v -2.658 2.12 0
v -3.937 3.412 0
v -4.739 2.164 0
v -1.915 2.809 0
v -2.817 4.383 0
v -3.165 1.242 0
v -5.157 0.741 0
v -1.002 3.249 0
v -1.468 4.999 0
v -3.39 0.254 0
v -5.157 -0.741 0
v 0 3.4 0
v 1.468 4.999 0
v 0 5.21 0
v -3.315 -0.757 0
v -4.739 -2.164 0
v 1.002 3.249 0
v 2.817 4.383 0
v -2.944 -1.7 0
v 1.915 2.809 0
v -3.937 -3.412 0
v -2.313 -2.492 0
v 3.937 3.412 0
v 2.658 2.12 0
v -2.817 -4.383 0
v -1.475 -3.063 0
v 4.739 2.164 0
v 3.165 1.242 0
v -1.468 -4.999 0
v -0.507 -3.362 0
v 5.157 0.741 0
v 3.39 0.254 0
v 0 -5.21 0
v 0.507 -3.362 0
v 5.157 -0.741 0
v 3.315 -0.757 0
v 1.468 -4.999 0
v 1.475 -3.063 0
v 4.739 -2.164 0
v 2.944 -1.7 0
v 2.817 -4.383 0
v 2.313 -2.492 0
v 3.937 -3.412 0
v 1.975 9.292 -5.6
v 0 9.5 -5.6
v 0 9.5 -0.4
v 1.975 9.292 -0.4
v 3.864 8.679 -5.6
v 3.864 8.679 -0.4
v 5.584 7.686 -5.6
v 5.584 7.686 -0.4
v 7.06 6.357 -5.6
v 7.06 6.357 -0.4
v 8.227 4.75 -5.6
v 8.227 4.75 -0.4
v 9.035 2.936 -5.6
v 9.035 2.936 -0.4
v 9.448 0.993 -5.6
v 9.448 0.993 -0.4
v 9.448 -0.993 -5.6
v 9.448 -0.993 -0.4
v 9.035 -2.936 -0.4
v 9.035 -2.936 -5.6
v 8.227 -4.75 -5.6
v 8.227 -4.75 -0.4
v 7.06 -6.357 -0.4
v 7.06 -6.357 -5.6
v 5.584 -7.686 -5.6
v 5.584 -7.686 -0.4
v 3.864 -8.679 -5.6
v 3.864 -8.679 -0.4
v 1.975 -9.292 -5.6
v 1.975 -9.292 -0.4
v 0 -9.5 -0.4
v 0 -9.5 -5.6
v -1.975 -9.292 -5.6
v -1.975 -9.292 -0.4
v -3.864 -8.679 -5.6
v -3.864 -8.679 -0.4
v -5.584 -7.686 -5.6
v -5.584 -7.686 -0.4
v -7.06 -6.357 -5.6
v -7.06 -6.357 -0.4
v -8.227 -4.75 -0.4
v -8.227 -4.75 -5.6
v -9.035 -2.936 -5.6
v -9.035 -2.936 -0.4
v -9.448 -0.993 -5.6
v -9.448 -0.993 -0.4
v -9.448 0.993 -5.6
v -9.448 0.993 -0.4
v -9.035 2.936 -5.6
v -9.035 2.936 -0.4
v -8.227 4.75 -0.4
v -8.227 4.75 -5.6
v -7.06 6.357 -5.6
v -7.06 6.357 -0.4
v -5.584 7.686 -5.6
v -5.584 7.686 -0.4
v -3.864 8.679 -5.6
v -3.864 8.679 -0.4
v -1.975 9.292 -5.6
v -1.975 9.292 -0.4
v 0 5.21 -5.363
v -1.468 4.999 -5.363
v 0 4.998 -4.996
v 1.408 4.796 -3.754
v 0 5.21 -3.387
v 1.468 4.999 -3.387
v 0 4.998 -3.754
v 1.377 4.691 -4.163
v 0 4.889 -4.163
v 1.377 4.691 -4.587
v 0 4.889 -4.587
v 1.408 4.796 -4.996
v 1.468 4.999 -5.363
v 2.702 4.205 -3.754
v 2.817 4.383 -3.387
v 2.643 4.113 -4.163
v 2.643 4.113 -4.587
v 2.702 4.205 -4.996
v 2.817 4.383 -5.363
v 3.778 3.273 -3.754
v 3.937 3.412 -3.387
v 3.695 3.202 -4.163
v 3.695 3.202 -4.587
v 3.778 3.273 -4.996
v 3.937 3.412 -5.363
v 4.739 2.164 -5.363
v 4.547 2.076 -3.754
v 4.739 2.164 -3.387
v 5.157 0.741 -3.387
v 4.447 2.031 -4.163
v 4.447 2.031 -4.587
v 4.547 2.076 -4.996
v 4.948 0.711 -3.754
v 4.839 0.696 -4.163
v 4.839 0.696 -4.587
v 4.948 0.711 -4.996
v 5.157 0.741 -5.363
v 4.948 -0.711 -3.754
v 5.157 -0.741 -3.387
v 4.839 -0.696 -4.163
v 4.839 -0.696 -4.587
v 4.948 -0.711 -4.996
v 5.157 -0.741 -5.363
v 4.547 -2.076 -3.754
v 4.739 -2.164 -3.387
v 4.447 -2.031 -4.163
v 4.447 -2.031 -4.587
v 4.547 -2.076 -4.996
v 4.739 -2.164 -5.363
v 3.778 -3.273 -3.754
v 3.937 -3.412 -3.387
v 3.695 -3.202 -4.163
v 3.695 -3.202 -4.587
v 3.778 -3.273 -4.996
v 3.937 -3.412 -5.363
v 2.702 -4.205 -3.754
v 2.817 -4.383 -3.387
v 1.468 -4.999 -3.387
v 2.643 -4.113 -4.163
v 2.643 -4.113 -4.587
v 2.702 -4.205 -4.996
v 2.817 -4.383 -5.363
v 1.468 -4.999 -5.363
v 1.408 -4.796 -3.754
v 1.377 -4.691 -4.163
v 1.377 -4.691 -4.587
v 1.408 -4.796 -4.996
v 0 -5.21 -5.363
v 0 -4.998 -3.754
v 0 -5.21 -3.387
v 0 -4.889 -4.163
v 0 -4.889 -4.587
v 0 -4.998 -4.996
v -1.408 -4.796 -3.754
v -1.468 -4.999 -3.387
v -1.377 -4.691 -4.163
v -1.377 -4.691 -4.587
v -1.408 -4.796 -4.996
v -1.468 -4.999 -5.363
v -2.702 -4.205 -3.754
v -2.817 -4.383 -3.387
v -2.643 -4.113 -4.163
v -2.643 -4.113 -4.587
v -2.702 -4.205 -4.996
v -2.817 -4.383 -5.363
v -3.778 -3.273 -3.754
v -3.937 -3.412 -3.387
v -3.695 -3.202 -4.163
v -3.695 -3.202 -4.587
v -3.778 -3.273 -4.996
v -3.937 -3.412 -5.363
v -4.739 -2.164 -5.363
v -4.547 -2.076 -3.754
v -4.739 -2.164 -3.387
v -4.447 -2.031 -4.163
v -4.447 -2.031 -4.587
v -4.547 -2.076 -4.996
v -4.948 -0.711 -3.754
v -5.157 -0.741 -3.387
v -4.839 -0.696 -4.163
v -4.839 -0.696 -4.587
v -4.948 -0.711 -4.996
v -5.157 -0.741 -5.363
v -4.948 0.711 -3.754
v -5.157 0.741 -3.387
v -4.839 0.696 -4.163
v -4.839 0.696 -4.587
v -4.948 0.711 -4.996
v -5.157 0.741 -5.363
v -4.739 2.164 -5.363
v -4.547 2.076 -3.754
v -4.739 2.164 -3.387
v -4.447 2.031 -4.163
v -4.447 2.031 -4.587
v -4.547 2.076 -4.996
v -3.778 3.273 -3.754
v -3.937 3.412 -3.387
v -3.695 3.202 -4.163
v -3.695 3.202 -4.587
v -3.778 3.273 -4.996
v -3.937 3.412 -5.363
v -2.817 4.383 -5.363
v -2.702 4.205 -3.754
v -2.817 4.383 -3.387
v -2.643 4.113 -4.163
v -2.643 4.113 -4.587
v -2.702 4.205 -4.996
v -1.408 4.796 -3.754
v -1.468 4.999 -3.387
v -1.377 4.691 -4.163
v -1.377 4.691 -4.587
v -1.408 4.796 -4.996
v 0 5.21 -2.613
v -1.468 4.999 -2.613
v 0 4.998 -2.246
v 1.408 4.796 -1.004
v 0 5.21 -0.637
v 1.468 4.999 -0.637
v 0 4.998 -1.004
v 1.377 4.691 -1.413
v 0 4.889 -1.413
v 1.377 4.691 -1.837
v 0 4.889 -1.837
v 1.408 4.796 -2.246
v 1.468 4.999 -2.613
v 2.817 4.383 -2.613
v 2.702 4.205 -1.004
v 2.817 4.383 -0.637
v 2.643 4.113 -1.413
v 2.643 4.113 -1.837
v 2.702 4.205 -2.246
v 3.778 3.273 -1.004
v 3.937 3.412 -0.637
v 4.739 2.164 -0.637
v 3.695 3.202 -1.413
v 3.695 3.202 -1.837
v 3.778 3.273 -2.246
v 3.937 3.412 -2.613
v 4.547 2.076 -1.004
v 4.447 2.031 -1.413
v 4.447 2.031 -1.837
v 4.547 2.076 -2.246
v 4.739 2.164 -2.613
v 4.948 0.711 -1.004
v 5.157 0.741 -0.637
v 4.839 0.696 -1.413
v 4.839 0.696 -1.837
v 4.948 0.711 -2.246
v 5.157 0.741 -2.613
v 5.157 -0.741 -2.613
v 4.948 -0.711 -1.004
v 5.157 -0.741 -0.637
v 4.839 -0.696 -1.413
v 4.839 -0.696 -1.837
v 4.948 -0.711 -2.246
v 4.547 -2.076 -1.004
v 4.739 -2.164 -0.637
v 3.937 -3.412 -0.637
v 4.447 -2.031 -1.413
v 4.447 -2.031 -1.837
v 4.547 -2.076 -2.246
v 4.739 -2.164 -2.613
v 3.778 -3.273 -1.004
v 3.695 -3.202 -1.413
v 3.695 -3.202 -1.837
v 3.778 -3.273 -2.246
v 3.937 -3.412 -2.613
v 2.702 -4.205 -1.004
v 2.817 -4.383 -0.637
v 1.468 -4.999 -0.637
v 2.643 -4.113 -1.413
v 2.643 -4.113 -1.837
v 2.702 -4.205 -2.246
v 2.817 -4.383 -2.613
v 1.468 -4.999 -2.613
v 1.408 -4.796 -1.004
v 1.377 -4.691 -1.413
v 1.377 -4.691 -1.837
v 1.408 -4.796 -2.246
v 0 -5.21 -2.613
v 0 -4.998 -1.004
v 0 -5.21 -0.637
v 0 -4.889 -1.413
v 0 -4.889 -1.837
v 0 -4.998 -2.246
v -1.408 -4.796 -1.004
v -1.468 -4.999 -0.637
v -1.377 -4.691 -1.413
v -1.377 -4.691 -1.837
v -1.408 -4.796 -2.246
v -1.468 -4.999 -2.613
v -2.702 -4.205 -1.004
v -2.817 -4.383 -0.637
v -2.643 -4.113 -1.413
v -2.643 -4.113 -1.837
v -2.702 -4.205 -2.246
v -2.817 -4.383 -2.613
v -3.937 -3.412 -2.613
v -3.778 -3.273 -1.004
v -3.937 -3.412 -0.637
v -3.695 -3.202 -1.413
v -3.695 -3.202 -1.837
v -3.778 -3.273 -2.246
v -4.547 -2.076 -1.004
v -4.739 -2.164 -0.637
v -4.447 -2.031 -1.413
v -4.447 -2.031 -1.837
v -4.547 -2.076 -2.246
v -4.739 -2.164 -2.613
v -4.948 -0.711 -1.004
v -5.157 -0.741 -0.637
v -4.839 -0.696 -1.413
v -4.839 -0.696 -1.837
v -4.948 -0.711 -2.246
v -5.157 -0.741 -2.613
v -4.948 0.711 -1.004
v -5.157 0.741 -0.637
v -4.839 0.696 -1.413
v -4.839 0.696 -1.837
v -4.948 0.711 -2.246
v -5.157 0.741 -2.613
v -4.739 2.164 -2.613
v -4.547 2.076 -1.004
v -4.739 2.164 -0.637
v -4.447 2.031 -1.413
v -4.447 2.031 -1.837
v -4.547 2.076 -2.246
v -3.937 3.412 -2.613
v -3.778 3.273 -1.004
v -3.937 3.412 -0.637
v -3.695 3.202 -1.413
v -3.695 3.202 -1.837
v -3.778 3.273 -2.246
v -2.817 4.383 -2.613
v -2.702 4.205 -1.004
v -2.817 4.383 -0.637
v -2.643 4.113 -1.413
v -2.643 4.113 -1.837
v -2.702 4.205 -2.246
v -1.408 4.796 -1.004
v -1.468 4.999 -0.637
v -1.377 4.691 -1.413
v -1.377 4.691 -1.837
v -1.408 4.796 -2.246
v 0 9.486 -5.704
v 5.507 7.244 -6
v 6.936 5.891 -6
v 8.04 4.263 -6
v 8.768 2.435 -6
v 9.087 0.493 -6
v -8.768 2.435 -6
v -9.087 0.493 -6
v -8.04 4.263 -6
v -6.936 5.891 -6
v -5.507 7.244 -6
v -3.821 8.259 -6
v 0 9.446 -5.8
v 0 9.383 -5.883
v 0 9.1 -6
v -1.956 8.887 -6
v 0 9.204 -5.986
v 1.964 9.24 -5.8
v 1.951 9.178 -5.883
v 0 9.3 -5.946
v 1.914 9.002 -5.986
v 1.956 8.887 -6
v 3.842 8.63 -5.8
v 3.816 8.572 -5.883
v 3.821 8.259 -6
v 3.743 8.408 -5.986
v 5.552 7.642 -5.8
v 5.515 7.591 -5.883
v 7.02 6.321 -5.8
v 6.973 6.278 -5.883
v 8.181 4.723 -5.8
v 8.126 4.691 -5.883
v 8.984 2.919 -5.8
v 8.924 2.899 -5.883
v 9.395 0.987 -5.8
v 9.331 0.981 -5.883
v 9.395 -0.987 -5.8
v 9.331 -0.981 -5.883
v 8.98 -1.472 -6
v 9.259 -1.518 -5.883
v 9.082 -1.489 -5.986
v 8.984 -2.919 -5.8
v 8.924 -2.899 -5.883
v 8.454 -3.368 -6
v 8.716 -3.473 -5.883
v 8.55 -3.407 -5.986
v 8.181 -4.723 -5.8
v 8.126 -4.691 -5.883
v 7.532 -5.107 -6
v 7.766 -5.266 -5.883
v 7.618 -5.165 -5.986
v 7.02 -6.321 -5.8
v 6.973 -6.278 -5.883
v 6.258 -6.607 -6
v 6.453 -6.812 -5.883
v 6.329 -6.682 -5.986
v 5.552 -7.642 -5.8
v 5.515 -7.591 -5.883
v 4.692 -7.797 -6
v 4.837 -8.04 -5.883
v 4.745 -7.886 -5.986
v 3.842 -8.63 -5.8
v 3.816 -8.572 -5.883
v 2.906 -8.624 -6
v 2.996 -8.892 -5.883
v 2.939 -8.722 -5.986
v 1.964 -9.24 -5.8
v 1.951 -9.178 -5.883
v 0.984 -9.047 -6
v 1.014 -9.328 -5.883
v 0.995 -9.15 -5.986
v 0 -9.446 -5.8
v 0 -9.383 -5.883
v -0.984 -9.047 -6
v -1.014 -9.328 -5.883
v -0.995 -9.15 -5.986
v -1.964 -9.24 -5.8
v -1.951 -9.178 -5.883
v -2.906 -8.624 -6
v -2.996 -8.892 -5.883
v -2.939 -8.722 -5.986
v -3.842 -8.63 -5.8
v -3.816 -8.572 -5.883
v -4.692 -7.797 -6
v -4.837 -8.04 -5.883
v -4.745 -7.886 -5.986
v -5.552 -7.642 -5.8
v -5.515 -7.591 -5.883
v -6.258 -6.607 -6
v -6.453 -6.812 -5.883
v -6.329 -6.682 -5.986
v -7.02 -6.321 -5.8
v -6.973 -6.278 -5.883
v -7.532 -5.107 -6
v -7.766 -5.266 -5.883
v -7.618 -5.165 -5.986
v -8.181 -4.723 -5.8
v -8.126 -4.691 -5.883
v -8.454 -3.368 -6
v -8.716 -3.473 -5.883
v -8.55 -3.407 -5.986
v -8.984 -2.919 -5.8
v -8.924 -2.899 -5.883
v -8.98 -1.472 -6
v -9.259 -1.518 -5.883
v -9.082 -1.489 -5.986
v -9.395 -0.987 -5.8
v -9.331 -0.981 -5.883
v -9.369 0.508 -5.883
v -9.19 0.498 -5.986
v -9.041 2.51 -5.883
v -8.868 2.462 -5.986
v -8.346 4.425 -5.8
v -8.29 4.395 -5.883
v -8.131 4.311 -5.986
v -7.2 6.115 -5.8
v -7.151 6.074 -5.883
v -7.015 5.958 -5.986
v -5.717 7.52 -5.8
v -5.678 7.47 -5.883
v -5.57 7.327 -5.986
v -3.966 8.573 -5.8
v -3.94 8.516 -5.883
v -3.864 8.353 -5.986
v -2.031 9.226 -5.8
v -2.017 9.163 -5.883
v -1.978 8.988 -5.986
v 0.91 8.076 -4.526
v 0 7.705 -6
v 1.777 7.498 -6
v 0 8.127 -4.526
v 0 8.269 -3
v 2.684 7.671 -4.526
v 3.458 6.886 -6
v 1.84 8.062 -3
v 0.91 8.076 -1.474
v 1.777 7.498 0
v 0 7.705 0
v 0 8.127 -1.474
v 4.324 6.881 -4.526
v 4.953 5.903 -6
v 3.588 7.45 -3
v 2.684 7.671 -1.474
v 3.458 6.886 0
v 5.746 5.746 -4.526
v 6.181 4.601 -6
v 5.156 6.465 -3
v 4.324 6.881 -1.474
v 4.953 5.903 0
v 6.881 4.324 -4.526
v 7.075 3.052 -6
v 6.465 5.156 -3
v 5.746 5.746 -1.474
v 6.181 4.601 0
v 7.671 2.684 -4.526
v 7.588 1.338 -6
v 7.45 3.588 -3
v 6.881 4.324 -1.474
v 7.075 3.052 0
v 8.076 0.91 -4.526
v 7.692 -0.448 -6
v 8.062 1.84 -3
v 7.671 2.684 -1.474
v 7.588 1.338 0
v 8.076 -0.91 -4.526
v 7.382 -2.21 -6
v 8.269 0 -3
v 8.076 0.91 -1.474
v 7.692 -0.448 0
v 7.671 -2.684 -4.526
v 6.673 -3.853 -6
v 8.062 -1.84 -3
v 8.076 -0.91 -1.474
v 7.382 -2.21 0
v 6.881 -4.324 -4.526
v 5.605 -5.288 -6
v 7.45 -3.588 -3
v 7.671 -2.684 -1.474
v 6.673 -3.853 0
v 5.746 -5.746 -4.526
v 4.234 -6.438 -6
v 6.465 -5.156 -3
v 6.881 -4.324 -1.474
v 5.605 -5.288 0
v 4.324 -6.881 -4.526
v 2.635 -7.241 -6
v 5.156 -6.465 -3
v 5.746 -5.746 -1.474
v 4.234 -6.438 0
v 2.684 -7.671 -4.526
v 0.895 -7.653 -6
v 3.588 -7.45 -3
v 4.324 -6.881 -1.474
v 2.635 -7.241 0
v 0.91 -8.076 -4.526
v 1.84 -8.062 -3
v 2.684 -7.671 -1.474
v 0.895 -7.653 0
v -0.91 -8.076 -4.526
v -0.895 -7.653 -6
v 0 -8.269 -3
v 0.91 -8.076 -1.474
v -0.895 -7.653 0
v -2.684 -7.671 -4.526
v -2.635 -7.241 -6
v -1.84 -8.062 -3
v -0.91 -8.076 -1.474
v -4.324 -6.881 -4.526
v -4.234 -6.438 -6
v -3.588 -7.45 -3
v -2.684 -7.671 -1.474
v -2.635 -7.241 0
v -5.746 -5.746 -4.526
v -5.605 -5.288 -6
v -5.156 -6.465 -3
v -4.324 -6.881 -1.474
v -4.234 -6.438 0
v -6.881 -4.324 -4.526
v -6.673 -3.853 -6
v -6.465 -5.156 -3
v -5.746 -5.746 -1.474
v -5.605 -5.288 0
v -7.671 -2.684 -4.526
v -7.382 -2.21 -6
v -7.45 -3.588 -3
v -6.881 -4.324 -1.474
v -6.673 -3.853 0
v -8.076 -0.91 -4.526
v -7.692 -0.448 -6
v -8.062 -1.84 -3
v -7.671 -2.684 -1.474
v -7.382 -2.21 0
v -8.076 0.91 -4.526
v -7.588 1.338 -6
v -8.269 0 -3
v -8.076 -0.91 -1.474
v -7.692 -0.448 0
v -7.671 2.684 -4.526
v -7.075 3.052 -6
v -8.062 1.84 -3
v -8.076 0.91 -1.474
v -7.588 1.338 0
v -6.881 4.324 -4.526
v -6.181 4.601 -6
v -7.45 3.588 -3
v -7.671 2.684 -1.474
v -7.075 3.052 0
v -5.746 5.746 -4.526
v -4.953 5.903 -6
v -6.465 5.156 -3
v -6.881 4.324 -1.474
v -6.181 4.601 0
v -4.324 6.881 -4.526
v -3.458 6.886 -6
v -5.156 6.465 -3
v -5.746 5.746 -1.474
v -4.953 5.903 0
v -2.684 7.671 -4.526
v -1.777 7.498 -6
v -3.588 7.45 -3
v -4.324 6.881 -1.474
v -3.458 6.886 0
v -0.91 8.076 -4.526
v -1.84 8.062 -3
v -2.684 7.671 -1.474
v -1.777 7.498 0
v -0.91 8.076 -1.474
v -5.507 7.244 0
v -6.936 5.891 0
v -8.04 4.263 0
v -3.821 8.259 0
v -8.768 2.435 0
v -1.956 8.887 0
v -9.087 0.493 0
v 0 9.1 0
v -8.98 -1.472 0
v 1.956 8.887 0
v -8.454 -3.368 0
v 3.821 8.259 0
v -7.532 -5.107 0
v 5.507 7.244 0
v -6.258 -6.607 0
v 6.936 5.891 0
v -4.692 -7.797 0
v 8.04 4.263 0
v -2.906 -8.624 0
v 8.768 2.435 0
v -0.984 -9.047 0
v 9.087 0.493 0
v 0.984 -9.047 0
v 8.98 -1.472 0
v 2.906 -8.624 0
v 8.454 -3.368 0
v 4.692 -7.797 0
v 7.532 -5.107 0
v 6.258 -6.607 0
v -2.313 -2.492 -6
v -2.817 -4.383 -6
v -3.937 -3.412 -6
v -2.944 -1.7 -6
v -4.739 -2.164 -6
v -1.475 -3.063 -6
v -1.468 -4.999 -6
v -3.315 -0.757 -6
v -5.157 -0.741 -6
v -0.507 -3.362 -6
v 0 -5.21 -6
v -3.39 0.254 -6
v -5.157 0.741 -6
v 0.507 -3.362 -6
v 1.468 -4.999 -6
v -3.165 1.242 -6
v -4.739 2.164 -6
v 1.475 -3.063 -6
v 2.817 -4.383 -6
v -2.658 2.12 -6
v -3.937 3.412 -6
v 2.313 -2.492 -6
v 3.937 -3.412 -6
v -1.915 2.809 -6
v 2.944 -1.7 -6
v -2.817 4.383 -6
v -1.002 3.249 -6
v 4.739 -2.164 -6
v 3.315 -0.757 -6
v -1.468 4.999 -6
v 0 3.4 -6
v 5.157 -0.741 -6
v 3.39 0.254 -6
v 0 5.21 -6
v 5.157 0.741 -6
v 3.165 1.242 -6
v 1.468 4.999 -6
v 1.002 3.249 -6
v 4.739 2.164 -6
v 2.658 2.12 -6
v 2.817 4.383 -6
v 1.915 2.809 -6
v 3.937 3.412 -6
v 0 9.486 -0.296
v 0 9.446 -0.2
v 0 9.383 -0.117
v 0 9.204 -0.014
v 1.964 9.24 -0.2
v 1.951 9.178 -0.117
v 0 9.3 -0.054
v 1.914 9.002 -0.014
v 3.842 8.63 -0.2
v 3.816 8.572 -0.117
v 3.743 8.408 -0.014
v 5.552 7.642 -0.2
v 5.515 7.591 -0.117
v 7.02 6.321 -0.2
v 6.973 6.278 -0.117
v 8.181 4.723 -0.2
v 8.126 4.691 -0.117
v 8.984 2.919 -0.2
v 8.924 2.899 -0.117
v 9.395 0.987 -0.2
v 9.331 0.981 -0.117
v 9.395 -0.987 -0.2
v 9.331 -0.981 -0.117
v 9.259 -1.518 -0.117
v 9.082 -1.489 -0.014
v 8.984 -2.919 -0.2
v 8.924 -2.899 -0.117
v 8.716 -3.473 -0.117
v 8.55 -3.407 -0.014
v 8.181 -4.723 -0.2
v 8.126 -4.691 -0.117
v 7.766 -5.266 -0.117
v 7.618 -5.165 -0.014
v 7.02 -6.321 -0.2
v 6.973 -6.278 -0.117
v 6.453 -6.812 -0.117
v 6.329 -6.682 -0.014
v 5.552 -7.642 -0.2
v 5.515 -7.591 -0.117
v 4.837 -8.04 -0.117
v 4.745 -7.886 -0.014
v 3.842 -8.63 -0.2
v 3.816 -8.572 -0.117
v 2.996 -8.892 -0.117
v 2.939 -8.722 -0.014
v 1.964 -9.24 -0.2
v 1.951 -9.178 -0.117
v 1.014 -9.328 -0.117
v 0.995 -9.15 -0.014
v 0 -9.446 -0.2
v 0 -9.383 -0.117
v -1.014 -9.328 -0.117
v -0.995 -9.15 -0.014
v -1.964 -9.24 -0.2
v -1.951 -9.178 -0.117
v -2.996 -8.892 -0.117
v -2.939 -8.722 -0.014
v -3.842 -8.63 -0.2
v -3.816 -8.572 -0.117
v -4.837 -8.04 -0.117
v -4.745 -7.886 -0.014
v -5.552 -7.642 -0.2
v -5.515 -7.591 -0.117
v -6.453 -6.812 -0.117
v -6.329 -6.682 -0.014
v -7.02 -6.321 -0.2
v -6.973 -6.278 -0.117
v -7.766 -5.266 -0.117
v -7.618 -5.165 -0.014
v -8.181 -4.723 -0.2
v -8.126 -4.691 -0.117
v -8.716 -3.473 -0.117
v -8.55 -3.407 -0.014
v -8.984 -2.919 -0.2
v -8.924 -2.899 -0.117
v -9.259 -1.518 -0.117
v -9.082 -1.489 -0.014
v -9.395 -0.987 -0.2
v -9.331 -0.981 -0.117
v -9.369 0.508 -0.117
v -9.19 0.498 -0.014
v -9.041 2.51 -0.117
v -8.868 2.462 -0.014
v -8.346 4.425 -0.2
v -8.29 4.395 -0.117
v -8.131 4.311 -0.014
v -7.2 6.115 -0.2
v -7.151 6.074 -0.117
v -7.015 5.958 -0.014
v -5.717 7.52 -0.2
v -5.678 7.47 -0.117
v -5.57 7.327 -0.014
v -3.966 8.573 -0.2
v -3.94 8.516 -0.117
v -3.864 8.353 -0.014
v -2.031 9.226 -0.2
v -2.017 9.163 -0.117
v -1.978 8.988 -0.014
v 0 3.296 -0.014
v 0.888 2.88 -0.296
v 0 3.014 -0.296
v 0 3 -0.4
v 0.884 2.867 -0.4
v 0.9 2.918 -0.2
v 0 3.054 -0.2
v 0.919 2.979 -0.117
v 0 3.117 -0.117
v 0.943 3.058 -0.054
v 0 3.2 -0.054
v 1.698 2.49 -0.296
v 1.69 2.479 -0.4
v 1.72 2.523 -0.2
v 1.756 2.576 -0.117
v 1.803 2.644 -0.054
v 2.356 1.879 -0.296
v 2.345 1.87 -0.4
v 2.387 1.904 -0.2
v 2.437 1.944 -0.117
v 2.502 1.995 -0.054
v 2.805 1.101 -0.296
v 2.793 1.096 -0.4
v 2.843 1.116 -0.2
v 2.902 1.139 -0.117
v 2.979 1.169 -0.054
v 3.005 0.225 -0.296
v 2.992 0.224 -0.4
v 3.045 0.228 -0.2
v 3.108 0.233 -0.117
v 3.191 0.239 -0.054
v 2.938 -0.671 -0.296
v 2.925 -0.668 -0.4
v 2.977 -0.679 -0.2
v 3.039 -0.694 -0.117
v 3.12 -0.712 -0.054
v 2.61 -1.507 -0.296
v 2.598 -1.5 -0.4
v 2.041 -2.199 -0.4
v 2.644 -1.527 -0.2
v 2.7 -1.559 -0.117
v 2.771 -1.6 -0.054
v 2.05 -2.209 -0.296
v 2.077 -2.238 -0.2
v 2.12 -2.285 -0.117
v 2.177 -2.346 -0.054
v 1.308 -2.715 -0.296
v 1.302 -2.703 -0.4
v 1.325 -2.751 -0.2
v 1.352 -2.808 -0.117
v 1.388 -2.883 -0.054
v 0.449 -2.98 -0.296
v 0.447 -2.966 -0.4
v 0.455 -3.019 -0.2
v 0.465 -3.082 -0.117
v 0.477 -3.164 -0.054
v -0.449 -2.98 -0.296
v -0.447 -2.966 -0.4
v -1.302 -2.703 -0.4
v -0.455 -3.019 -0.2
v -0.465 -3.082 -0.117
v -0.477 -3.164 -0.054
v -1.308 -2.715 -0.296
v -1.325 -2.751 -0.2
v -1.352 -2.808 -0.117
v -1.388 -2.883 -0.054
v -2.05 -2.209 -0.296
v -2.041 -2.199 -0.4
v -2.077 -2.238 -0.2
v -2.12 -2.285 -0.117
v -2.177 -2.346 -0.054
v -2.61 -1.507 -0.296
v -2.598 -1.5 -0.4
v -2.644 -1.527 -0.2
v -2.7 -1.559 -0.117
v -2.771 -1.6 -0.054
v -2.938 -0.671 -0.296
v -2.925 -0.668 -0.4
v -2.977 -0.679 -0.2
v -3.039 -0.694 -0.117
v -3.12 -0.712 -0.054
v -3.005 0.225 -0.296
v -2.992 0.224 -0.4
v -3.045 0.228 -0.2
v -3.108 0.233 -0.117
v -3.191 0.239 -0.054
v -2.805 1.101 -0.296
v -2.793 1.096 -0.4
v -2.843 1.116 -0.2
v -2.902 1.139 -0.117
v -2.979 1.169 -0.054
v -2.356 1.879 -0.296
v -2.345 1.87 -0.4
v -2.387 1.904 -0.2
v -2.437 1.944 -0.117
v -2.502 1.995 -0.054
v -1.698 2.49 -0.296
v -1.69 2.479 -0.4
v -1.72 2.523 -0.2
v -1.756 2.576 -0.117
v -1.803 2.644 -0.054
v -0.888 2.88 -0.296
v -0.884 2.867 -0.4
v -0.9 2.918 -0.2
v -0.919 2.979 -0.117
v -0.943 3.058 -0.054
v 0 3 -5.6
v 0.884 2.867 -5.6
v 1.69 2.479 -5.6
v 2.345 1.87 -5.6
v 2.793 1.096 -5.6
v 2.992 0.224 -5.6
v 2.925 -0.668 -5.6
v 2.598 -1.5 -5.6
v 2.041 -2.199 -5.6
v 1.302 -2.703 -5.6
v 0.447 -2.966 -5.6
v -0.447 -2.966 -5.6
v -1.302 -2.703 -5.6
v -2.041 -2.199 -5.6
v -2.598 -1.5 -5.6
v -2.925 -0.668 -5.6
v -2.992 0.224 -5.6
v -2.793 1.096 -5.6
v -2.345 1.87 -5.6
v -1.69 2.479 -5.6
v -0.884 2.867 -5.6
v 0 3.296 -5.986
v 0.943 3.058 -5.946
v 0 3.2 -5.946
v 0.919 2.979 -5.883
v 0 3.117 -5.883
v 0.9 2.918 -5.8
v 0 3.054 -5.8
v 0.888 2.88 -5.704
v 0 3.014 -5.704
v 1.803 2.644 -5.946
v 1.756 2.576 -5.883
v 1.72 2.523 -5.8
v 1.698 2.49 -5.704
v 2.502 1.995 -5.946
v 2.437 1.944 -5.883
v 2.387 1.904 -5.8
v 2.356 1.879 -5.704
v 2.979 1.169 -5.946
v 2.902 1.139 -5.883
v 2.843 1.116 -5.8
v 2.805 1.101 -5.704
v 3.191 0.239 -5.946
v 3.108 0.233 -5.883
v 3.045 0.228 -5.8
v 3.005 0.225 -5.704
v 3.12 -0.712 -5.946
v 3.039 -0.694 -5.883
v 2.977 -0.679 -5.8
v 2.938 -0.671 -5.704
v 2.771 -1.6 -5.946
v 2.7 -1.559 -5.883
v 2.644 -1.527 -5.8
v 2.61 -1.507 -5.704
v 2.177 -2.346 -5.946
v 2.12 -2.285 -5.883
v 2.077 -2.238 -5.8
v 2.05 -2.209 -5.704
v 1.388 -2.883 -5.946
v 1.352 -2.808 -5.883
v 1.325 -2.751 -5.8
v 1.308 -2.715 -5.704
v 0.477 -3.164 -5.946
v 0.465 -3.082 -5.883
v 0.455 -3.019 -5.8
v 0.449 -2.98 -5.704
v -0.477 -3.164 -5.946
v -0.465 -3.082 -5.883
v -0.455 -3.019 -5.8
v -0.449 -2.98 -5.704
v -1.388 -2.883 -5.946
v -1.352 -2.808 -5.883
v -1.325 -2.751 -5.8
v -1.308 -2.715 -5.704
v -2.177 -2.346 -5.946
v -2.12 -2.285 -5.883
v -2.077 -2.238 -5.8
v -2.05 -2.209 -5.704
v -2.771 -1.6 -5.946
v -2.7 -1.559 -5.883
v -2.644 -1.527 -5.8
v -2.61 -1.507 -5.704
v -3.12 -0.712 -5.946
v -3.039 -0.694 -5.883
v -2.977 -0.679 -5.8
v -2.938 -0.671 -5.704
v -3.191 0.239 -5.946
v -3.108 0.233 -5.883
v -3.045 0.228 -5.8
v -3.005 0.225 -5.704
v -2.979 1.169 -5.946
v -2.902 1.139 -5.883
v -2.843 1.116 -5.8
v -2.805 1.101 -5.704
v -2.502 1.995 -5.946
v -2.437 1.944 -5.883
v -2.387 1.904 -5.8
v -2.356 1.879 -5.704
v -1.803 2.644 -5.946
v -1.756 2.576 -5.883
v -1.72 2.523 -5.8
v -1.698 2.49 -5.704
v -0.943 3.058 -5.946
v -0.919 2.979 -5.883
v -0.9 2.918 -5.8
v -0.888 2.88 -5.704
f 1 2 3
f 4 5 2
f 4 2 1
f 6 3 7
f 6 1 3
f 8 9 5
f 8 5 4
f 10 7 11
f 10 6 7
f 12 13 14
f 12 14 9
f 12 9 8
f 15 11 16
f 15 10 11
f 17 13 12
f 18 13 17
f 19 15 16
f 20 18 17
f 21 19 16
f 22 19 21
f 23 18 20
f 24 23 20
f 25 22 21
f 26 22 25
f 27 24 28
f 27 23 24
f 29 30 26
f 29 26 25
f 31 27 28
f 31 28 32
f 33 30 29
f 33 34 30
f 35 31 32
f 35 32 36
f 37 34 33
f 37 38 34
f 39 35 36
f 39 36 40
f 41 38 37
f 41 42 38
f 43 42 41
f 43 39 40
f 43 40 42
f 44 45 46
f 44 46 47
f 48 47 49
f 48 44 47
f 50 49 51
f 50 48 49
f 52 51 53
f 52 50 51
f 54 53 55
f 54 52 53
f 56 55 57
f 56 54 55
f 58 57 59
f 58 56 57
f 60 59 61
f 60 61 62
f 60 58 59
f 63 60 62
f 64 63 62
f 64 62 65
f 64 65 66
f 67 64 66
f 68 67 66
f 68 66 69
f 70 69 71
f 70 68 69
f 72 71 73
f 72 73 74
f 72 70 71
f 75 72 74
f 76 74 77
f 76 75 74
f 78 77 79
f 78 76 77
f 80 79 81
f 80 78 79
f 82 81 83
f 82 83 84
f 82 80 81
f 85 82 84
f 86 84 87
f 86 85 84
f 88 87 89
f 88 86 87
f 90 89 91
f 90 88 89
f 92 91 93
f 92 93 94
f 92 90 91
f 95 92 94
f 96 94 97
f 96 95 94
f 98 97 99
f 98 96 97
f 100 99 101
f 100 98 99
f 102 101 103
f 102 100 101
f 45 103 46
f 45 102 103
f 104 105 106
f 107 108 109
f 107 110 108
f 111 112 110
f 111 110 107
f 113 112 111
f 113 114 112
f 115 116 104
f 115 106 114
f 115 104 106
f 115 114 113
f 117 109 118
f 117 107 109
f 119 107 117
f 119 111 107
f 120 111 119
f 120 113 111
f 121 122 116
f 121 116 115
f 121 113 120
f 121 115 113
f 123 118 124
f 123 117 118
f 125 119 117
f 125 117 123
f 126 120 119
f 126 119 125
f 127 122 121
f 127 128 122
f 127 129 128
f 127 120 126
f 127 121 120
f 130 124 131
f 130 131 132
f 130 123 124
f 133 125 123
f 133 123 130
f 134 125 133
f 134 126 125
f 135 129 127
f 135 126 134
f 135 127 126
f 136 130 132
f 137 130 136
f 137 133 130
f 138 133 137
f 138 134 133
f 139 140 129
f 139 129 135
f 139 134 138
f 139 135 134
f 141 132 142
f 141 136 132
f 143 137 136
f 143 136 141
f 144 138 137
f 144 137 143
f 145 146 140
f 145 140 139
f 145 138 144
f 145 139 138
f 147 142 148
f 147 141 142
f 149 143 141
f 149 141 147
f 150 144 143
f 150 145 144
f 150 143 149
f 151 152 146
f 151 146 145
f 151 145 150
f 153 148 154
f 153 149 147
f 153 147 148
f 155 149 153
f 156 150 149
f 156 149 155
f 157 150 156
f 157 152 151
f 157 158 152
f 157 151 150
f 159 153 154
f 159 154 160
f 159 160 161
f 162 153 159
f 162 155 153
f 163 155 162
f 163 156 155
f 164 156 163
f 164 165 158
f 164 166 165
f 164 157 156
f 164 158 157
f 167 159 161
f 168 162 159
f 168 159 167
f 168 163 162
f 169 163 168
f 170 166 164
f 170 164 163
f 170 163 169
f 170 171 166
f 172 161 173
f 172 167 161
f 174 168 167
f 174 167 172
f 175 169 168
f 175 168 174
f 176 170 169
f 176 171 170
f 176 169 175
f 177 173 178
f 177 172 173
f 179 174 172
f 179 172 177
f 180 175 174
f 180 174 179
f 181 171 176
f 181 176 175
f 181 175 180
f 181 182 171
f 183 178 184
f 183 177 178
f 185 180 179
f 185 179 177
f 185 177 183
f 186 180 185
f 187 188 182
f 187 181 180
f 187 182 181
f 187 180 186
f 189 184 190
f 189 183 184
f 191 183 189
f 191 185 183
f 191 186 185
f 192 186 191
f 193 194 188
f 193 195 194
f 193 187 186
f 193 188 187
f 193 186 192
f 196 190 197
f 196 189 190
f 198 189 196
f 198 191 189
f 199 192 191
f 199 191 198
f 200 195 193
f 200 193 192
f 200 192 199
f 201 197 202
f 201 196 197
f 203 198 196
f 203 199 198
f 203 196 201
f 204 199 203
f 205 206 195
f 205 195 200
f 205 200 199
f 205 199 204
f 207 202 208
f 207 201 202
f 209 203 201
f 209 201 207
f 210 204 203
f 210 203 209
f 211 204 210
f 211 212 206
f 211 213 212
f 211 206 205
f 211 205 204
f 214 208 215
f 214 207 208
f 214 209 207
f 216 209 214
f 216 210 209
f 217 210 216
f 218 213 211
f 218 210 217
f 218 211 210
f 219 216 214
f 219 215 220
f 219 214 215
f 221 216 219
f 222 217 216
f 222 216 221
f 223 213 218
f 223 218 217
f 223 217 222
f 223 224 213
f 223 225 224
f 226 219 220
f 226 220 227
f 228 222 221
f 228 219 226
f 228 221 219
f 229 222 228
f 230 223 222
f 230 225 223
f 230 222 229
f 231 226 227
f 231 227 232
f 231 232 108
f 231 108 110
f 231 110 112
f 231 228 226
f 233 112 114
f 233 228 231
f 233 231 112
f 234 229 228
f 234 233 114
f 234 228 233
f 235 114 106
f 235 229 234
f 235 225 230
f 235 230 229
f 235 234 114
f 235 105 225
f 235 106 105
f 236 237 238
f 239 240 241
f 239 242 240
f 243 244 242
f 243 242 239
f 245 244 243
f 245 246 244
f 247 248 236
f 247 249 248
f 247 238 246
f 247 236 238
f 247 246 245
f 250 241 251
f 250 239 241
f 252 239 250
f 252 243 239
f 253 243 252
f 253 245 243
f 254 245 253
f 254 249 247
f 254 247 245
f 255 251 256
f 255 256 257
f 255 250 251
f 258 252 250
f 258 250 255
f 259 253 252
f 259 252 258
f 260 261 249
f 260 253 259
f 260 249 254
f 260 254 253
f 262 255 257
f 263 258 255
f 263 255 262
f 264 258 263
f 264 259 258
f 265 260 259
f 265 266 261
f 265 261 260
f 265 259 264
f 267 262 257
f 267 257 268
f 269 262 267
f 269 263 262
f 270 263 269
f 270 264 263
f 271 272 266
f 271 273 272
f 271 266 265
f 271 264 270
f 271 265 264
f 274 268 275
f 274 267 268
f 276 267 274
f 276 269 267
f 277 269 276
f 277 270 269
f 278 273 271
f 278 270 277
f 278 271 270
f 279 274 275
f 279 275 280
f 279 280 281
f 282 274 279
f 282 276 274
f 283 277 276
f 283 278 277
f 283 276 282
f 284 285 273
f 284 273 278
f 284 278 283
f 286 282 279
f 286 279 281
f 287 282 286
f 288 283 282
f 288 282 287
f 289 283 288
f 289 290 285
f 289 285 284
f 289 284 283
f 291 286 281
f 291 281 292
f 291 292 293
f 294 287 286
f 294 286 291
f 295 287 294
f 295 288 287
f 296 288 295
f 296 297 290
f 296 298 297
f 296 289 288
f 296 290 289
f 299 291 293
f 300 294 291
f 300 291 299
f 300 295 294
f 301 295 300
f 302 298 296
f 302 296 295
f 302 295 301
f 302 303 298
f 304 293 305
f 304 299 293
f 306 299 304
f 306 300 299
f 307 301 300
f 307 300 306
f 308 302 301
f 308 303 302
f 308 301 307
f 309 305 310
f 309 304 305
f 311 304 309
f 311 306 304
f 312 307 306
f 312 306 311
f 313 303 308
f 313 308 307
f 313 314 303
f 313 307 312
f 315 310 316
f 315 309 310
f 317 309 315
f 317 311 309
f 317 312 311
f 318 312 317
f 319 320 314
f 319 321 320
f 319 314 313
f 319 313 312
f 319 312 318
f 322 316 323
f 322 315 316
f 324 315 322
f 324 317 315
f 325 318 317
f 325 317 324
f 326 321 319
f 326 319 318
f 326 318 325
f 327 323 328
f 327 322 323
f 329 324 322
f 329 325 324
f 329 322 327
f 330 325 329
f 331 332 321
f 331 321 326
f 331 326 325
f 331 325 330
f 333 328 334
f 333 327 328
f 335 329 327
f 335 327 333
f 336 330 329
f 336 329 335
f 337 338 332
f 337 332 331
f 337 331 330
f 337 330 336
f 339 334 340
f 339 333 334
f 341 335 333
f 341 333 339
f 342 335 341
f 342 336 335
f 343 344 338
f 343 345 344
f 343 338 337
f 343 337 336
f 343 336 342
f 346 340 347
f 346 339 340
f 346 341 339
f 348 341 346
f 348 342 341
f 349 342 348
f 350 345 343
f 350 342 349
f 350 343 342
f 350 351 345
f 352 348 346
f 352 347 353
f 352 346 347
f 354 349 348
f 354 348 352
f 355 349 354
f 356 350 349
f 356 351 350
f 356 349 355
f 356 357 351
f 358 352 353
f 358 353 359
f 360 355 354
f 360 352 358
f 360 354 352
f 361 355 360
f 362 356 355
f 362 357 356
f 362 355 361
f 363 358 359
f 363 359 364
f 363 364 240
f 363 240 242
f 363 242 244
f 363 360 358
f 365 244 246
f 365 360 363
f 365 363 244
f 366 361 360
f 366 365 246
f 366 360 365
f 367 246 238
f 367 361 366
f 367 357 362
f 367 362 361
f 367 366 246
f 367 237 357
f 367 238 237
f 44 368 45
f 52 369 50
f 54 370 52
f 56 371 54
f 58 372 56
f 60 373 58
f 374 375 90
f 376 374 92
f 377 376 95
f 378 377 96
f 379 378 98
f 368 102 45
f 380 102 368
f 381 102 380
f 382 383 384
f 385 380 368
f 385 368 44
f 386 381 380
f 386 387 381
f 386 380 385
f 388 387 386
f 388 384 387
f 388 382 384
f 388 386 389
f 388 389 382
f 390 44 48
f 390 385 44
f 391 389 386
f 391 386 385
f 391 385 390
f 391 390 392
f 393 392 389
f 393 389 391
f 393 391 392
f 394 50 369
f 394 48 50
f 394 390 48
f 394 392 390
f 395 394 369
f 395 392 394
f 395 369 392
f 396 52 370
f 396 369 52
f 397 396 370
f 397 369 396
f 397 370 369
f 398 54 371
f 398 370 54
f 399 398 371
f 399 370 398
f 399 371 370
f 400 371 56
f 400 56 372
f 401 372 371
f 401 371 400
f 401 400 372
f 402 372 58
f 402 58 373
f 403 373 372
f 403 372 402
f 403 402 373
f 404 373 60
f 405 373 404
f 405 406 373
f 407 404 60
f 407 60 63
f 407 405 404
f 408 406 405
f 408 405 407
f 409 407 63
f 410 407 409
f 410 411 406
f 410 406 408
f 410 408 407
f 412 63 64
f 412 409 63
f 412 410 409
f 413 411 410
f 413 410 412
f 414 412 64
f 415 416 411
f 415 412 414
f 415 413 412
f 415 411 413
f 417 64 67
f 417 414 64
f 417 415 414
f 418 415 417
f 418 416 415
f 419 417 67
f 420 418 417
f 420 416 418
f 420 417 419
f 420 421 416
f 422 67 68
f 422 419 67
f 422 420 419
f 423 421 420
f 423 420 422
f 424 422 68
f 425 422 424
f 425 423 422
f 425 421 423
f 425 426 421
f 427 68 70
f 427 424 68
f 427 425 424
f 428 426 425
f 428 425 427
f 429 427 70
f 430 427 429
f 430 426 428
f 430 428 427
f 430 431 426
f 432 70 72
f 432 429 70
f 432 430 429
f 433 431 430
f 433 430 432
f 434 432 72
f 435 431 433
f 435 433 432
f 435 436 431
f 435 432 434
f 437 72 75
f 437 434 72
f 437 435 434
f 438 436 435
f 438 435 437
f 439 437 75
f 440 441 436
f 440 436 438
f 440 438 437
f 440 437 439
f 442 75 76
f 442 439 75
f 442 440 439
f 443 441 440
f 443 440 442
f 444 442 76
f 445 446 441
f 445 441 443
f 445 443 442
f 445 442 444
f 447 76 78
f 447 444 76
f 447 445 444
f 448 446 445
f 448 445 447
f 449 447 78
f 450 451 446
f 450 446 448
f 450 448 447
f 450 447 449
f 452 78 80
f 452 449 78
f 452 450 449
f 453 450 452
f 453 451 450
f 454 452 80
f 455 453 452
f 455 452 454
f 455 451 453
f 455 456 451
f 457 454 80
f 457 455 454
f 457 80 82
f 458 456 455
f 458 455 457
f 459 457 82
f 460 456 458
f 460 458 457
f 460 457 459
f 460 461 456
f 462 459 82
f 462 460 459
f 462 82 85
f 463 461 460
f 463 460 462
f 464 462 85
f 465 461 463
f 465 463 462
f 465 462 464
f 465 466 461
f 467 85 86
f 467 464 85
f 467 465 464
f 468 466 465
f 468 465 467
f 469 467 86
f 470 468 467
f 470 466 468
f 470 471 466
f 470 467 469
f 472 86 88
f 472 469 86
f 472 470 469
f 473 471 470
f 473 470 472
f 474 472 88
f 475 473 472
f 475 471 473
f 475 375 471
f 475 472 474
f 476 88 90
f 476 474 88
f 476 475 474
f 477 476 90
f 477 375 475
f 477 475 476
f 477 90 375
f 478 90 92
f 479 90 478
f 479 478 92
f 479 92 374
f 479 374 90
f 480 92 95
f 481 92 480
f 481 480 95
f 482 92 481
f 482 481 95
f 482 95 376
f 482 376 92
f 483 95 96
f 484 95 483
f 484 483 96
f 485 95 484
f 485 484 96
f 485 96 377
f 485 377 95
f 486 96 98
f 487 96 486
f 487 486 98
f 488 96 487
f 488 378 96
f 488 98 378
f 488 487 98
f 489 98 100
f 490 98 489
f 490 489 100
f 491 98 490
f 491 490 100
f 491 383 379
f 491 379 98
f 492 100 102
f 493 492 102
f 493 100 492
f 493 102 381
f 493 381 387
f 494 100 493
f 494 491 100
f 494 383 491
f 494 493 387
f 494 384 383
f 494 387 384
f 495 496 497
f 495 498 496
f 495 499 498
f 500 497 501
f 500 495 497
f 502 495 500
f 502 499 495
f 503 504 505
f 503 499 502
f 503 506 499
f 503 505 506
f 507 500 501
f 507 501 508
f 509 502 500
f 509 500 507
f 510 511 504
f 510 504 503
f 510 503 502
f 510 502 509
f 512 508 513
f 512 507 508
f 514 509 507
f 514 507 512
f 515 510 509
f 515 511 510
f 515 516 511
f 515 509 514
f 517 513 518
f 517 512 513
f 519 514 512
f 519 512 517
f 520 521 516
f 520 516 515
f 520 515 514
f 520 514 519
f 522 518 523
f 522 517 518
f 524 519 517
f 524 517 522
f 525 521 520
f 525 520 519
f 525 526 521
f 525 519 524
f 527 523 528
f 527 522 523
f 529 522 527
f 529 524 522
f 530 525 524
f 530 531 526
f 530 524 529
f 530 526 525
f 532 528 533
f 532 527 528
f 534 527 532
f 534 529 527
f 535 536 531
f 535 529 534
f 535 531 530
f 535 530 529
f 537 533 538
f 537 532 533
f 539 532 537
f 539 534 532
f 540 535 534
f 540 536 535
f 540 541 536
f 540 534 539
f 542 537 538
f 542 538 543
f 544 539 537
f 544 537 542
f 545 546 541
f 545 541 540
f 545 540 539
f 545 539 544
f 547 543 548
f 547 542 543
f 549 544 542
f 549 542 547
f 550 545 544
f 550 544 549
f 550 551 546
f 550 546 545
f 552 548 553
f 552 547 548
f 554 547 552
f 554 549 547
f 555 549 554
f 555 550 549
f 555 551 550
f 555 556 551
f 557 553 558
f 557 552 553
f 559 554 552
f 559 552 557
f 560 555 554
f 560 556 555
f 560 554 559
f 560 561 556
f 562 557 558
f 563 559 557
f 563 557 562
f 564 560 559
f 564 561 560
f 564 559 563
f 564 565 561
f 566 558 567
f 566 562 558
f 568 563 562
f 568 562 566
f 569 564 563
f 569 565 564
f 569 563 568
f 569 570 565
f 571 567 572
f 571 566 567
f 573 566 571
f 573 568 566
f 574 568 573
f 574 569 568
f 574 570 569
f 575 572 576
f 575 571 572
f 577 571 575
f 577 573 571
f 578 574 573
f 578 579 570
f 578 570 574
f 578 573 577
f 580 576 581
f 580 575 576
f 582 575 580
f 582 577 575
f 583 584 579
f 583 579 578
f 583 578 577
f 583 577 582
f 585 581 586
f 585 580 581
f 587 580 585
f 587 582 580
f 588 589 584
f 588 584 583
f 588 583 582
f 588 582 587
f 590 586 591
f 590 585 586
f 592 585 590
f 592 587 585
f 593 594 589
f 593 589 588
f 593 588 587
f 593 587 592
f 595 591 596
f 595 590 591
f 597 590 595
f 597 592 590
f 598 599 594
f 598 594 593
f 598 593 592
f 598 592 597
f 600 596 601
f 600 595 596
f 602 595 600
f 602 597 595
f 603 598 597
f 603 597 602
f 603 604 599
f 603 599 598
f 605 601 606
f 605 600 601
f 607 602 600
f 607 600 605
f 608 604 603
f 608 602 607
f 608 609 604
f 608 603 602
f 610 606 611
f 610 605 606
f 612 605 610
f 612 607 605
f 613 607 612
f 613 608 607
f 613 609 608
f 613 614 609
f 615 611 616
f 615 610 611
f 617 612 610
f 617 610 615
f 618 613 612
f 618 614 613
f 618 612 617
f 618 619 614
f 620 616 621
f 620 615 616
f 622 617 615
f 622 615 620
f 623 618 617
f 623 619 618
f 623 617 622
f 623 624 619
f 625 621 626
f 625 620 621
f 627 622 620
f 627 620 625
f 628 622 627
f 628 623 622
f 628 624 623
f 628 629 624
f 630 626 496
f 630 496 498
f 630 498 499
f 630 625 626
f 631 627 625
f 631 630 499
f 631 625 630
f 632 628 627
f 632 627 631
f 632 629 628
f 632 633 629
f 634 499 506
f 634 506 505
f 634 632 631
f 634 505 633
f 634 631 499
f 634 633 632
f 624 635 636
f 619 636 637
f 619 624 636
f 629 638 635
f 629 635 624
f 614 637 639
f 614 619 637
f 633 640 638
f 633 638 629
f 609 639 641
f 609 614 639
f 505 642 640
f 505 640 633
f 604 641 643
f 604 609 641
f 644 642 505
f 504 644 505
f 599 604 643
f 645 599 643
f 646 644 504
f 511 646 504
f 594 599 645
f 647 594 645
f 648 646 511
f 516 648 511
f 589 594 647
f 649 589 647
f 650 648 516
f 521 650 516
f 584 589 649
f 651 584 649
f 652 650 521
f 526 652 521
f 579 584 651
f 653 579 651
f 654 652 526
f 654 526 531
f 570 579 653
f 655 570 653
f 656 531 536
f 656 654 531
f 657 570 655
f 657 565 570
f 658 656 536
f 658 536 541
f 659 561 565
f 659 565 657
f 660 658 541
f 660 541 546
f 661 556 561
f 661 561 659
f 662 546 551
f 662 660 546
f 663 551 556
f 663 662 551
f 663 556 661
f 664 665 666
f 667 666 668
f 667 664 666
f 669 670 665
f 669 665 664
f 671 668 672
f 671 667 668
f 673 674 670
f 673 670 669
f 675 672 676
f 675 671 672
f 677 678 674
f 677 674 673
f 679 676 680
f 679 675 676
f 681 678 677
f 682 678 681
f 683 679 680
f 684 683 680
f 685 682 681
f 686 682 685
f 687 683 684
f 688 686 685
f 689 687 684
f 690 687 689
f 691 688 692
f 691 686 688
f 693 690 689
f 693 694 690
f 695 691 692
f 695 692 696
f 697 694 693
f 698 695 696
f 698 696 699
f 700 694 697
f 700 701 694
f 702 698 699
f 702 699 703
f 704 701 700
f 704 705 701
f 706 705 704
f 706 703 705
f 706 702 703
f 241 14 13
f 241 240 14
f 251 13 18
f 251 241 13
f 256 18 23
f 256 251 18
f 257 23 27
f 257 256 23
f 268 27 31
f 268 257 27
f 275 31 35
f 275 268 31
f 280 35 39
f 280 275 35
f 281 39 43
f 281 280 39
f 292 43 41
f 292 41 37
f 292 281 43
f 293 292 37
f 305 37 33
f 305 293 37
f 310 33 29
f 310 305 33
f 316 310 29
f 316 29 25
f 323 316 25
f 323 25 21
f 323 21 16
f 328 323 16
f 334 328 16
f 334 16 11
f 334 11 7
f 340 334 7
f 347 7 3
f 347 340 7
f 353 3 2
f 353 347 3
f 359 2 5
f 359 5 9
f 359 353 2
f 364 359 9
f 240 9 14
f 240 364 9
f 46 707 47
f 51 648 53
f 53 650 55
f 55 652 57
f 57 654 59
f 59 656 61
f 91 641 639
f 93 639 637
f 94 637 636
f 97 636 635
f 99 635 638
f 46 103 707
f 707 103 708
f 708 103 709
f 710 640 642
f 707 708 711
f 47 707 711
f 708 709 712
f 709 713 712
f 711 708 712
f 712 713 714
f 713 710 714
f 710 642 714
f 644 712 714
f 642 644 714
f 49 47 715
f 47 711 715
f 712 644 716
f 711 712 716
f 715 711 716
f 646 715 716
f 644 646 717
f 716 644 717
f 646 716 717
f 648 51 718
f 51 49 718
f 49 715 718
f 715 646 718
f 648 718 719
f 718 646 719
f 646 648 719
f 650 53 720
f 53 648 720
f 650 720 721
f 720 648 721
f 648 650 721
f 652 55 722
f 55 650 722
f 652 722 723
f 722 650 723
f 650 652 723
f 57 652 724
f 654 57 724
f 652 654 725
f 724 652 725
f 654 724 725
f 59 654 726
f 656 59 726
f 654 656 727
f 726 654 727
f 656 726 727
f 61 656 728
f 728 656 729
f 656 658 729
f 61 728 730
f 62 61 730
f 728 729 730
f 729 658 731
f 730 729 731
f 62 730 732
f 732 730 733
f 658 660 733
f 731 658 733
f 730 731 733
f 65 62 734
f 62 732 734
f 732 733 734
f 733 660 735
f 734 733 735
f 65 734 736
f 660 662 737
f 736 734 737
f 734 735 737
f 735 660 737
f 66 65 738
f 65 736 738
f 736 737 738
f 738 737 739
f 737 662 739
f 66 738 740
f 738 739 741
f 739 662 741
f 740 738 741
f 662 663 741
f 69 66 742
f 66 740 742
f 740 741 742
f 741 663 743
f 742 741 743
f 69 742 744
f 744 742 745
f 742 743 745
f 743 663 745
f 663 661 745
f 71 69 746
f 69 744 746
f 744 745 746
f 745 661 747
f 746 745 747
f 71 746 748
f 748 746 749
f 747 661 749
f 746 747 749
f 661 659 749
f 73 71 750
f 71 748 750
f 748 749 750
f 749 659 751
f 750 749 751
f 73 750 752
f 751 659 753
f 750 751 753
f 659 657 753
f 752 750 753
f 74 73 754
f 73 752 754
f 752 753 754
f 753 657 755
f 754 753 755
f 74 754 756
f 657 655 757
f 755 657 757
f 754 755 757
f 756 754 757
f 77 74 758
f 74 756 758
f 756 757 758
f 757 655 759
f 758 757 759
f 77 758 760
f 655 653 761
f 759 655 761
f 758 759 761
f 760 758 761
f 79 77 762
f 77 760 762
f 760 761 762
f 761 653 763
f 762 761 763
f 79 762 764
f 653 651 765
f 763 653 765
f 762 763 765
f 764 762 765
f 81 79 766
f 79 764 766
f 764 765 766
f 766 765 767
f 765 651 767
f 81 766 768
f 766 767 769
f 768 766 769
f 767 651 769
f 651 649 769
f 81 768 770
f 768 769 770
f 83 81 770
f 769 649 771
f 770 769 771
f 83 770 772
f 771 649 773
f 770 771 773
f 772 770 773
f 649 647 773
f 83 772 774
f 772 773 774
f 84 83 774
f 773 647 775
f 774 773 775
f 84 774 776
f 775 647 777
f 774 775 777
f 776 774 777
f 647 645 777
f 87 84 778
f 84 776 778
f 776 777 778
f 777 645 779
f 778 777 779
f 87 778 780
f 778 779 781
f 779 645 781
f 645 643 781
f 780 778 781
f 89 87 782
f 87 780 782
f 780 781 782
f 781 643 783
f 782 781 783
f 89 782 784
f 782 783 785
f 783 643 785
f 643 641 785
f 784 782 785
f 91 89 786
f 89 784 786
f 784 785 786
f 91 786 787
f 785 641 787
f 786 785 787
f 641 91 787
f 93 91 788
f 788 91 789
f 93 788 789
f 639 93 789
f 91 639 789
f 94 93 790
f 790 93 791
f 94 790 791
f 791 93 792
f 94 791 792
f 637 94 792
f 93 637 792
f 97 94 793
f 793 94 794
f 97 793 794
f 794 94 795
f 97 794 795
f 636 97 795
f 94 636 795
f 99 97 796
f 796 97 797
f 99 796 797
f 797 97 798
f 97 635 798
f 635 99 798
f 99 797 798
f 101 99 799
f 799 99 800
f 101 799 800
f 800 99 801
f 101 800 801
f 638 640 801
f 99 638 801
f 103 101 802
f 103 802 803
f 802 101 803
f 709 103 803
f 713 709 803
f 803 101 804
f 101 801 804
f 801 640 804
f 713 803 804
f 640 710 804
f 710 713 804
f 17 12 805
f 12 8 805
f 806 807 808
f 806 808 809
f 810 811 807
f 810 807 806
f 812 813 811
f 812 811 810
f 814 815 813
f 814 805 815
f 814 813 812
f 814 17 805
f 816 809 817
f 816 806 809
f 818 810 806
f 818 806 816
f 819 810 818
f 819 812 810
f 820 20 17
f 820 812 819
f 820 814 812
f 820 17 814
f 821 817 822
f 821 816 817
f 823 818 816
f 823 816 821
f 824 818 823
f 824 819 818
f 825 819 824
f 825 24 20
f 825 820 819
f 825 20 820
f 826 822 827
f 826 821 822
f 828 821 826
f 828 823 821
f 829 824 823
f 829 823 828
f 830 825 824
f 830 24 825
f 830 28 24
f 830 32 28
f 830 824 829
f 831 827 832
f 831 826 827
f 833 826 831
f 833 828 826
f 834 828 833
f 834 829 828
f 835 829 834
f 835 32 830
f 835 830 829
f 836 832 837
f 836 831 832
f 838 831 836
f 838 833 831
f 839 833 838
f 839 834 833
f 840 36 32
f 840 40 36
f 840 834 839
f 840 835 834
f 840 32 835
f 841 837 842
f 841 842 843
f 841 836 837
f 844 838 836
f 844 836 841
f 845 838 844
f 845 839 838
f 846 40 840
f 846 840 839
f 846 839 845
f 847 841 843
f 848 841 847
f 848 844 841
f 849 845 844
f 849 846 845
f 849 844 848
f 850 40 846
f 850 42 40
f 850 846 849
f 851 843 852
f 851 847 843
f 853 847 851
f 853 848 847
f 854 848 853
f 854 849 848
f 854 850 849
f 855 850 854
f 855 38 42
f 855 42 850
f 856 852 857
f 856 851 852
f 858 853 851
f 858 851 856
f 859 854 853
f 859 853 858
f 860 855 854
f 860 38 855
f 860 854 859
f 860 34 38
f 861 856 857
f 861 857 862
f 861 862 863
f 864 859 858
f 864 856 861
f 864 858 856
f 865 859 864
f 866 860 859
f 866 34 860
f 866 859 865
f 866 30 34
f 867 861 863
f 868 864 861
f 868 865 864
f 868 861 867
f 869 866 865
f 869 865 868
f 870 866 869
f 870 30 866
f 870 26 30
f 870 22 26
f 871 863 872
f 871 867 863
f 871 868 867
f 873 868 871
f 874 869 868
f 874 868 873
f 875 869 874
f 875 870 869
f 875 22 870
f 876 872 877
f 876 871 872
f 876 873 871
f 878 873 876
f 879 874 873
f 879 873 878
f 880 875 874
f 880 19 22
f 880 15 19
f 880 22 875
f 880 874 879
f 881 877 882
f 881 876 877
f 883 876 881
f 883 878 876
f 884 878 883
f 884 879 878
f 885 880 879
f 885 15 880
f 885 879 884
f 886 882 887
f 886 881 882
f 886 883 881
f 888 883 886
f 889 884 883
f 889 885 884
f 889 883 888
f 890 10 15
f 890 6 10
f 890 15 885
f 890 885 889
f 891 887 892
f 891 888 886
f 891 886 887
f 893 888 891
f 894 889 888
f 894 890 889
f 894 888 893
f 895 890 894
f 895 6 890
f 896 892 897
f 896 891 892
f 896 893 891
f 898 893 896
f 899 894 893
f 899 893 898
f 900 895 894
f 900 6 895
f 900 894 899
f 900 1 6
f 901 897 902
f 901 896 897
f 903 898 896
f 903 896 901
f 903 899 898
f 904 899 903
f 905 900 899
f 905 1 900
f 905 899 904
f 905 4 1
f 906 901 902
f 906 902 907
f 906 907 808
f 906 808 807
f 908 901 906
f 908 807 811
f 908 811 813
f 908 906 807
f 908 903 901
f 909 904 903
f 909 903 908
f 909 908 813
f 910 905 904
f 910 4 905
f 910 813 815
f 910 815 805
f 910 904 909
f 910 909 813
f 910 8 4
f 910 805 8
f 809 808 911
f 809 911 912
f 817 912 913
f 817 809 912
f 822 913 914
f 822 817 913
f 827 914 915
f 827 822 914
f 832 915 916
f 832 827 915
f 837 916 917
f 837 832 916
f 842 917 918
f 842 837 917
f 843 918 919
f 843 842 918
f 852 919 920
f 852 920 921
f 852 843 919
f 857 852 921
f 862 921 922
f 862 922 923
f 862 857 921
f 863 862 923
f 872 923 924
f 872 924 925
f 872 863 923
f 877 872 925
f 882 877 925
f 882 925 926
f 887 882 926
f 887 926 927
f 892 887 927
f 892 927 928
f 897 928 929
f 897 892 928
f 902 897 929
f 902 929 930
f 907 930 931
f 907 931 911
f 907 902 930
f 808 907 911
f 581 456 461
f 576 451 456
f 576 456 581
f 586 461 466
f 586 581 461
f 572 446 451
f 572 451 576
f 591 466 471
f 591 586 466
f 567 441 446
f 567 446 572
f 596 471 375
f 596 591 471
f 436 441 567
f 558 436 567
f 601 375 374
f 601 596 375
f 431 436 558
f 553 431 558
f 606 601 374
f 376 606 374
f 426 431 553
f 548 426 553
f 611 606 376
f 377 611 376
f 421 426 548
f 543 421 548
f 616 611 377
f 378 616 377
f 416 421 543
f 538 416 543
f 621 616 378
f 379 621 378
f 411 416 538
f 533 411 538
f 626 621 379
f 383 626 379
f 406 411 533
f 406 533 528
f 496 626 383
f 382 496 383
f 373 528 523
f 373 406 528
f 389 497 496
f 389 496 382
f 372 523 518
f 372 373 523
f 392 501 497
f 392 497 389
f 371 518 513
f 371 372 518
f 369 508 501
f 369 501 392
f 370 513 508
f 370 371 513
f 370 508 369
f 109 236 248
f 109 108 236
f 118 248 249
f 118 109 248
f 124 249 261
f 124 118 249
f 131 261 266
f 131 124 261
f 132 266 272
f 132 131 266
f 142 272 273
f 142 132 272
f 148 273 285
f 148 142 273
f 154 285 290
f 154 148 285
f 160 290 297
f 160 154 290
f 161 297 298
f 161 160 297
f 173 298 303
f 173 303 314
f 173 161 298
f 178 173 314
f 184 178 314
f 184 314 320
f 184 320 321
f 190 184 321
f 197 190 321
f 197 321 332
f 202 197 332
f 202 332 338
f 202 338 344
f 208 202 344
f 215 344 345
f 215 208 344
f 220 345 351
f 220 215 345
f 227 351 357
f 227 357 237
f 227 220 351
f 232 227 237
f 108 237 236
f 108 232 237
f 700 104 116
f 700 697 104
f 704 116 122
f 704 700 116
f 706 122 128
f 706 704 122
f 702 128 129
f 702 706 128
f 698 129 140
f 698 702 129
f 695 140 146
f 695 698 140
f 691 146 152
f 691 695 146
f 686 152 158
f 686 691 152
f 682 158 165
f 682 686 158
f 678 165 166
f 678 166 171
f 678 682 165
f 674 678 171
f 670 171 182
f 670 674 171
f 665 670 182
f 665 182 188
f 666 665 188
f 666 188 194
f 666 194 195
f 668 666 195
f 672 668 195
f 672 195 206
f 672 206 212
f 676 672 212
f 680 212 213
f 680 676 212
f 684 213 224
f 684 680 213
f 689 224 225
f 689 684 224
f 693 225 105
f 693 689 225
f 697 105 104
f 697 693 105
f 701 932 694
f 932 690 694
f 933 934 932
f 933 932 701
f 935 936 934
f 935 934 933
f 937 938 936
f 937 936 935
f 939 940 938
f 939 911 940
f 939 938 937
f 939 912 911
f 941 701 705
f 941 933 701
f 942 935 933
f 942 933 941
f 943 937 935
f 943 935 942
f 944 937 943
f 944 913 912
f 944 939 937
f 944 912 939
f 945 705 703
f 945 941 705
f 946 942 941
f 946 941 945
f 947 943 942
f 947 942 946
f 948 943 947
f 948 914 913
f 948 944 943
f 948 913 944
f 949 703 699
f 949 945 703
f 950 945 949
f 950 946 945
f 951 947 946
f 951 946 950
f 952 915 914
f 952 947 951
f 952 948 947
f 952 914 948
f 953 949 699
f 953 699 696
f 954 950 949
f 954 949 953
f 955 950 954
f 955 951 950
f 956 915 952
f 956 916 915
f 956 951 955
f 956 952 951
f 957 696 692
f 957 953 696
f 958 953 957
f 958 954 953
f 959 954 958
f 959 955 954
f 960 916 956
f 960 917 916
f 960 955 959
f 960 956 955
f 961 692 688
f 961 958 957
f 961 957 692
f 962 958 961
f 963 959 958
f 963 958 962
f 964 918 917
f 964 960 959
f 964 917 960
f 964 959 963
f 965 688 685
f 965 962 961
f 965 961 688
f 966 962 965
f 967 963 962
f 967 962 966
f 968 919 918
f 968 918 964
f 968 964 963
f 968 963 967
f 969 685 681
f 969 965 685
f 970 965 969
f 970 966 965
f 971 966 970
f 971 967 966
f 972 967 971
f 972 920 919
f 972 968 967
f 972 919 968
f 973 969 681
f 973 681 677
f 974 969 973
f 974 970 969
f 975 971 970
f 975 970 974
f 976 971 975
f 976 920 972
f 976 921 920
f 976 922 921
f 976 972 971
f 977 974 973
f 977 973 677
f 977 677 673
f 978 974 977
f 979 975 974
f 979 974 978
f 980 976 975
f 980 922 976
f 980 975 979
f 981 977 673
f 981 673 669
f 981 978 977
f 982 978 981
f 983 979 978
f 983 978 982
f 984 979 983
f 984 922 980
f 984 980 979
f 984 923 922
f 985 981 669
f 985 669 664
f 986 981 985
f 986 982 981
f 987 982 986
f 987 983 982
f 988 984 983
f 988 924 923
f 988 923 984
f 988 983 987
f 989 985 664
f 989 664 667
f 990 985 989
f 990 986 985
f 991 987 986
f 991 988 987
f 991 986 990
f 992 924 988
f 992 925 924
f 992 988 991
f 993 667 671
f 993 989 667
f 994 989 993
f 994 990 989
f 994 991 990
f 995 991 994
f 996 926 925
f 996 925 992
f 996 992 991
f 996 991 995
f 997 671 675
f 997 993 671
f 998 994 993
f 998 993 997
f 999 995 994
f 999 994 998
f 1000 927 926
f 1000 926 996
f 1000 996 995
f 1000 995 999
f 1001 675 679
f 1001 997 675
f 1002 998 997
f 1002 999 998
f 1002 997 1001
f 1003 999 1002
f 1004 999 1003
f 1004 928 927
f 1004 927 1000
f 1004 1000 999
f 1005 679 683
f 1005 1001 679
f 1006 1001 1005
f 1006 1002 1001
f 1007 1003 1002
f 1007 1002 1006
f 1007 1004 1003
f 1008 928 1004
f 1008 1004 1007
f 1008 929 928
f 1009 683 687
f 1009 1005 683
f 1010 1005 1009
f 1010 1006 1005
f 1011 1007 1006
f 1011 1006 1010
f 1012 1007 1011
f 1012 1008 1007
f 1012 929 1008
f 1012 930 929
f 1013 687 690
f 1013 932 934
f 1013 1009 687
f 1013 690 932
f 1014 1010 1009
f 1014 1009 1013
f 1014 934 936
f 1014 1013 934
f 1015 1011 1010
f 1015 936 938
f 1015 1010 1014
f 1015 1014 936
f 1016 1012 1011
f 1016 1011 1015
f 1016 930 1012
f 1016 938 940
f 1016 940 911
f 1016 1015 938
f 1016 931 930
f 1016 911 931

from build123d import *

# Parameters (mm, degrees)
FILLET_1_R = 0.4
FILLET_2_R = 0.4


with BuildPart() as part:
    # Эскиз1 → Повернуть1 (revolve)
    with BuildSketch(Plane(origin=(0, 0, 0), x_dir=(0, 0, -1), z_dir=(1, 0, 0))):
        with BuildLine():
            Line((0, 5.21), (0.636807205, 5.21))
            ThreePointArc((0.636807205, 5.21), (1.625, 4.875), (2.613192795, 5.21))
            Line((2.613192795, 5.21), (3.386807205, 5.21))
            ThreePointArc((3.386807205, 5.21), (4.375, 4.875), (5.363192795, 5.21))
            Line((5.363192795, 5.21), (6, 5.21))
            Line((6, 5.21), (6, 3))
            Line((6, 3), (0, 3))
            Line((0, 3), (0, 5.21))
        make_face()
        with BuildLine():
            Line((0, 9.5), (6, 9.5))
            Line((6, 9.5), (6, 7.705435334))
            ThreePointArc((6, 7.705435334), (3, 8.268841133), (0, 7.705435334))
            Line((0, 7.705435334), (0, 9.5))
        make_face()
    revolve(axis=Axis((0, 0, 0), (0, 0, -1)))

    # Скругление1
    fillet_1_edges = [part.edges().sort_by_distance(p)[0] for p in [
        (0, -3, -6),
        (0, -3, 0),
    ]]
    fillet(fillet_1_edges, radius=FILLET_1_R)

    # Скругление2
    fillet_2_edges = [part.edges().sort_by_distance(p)[0] for p in [
        (0, -9.5, 0),
        (0, -9.5, -6),
    ]]
    fillet(fillet_2_edges, radius=FILLET_2_R)


solid = part.part
